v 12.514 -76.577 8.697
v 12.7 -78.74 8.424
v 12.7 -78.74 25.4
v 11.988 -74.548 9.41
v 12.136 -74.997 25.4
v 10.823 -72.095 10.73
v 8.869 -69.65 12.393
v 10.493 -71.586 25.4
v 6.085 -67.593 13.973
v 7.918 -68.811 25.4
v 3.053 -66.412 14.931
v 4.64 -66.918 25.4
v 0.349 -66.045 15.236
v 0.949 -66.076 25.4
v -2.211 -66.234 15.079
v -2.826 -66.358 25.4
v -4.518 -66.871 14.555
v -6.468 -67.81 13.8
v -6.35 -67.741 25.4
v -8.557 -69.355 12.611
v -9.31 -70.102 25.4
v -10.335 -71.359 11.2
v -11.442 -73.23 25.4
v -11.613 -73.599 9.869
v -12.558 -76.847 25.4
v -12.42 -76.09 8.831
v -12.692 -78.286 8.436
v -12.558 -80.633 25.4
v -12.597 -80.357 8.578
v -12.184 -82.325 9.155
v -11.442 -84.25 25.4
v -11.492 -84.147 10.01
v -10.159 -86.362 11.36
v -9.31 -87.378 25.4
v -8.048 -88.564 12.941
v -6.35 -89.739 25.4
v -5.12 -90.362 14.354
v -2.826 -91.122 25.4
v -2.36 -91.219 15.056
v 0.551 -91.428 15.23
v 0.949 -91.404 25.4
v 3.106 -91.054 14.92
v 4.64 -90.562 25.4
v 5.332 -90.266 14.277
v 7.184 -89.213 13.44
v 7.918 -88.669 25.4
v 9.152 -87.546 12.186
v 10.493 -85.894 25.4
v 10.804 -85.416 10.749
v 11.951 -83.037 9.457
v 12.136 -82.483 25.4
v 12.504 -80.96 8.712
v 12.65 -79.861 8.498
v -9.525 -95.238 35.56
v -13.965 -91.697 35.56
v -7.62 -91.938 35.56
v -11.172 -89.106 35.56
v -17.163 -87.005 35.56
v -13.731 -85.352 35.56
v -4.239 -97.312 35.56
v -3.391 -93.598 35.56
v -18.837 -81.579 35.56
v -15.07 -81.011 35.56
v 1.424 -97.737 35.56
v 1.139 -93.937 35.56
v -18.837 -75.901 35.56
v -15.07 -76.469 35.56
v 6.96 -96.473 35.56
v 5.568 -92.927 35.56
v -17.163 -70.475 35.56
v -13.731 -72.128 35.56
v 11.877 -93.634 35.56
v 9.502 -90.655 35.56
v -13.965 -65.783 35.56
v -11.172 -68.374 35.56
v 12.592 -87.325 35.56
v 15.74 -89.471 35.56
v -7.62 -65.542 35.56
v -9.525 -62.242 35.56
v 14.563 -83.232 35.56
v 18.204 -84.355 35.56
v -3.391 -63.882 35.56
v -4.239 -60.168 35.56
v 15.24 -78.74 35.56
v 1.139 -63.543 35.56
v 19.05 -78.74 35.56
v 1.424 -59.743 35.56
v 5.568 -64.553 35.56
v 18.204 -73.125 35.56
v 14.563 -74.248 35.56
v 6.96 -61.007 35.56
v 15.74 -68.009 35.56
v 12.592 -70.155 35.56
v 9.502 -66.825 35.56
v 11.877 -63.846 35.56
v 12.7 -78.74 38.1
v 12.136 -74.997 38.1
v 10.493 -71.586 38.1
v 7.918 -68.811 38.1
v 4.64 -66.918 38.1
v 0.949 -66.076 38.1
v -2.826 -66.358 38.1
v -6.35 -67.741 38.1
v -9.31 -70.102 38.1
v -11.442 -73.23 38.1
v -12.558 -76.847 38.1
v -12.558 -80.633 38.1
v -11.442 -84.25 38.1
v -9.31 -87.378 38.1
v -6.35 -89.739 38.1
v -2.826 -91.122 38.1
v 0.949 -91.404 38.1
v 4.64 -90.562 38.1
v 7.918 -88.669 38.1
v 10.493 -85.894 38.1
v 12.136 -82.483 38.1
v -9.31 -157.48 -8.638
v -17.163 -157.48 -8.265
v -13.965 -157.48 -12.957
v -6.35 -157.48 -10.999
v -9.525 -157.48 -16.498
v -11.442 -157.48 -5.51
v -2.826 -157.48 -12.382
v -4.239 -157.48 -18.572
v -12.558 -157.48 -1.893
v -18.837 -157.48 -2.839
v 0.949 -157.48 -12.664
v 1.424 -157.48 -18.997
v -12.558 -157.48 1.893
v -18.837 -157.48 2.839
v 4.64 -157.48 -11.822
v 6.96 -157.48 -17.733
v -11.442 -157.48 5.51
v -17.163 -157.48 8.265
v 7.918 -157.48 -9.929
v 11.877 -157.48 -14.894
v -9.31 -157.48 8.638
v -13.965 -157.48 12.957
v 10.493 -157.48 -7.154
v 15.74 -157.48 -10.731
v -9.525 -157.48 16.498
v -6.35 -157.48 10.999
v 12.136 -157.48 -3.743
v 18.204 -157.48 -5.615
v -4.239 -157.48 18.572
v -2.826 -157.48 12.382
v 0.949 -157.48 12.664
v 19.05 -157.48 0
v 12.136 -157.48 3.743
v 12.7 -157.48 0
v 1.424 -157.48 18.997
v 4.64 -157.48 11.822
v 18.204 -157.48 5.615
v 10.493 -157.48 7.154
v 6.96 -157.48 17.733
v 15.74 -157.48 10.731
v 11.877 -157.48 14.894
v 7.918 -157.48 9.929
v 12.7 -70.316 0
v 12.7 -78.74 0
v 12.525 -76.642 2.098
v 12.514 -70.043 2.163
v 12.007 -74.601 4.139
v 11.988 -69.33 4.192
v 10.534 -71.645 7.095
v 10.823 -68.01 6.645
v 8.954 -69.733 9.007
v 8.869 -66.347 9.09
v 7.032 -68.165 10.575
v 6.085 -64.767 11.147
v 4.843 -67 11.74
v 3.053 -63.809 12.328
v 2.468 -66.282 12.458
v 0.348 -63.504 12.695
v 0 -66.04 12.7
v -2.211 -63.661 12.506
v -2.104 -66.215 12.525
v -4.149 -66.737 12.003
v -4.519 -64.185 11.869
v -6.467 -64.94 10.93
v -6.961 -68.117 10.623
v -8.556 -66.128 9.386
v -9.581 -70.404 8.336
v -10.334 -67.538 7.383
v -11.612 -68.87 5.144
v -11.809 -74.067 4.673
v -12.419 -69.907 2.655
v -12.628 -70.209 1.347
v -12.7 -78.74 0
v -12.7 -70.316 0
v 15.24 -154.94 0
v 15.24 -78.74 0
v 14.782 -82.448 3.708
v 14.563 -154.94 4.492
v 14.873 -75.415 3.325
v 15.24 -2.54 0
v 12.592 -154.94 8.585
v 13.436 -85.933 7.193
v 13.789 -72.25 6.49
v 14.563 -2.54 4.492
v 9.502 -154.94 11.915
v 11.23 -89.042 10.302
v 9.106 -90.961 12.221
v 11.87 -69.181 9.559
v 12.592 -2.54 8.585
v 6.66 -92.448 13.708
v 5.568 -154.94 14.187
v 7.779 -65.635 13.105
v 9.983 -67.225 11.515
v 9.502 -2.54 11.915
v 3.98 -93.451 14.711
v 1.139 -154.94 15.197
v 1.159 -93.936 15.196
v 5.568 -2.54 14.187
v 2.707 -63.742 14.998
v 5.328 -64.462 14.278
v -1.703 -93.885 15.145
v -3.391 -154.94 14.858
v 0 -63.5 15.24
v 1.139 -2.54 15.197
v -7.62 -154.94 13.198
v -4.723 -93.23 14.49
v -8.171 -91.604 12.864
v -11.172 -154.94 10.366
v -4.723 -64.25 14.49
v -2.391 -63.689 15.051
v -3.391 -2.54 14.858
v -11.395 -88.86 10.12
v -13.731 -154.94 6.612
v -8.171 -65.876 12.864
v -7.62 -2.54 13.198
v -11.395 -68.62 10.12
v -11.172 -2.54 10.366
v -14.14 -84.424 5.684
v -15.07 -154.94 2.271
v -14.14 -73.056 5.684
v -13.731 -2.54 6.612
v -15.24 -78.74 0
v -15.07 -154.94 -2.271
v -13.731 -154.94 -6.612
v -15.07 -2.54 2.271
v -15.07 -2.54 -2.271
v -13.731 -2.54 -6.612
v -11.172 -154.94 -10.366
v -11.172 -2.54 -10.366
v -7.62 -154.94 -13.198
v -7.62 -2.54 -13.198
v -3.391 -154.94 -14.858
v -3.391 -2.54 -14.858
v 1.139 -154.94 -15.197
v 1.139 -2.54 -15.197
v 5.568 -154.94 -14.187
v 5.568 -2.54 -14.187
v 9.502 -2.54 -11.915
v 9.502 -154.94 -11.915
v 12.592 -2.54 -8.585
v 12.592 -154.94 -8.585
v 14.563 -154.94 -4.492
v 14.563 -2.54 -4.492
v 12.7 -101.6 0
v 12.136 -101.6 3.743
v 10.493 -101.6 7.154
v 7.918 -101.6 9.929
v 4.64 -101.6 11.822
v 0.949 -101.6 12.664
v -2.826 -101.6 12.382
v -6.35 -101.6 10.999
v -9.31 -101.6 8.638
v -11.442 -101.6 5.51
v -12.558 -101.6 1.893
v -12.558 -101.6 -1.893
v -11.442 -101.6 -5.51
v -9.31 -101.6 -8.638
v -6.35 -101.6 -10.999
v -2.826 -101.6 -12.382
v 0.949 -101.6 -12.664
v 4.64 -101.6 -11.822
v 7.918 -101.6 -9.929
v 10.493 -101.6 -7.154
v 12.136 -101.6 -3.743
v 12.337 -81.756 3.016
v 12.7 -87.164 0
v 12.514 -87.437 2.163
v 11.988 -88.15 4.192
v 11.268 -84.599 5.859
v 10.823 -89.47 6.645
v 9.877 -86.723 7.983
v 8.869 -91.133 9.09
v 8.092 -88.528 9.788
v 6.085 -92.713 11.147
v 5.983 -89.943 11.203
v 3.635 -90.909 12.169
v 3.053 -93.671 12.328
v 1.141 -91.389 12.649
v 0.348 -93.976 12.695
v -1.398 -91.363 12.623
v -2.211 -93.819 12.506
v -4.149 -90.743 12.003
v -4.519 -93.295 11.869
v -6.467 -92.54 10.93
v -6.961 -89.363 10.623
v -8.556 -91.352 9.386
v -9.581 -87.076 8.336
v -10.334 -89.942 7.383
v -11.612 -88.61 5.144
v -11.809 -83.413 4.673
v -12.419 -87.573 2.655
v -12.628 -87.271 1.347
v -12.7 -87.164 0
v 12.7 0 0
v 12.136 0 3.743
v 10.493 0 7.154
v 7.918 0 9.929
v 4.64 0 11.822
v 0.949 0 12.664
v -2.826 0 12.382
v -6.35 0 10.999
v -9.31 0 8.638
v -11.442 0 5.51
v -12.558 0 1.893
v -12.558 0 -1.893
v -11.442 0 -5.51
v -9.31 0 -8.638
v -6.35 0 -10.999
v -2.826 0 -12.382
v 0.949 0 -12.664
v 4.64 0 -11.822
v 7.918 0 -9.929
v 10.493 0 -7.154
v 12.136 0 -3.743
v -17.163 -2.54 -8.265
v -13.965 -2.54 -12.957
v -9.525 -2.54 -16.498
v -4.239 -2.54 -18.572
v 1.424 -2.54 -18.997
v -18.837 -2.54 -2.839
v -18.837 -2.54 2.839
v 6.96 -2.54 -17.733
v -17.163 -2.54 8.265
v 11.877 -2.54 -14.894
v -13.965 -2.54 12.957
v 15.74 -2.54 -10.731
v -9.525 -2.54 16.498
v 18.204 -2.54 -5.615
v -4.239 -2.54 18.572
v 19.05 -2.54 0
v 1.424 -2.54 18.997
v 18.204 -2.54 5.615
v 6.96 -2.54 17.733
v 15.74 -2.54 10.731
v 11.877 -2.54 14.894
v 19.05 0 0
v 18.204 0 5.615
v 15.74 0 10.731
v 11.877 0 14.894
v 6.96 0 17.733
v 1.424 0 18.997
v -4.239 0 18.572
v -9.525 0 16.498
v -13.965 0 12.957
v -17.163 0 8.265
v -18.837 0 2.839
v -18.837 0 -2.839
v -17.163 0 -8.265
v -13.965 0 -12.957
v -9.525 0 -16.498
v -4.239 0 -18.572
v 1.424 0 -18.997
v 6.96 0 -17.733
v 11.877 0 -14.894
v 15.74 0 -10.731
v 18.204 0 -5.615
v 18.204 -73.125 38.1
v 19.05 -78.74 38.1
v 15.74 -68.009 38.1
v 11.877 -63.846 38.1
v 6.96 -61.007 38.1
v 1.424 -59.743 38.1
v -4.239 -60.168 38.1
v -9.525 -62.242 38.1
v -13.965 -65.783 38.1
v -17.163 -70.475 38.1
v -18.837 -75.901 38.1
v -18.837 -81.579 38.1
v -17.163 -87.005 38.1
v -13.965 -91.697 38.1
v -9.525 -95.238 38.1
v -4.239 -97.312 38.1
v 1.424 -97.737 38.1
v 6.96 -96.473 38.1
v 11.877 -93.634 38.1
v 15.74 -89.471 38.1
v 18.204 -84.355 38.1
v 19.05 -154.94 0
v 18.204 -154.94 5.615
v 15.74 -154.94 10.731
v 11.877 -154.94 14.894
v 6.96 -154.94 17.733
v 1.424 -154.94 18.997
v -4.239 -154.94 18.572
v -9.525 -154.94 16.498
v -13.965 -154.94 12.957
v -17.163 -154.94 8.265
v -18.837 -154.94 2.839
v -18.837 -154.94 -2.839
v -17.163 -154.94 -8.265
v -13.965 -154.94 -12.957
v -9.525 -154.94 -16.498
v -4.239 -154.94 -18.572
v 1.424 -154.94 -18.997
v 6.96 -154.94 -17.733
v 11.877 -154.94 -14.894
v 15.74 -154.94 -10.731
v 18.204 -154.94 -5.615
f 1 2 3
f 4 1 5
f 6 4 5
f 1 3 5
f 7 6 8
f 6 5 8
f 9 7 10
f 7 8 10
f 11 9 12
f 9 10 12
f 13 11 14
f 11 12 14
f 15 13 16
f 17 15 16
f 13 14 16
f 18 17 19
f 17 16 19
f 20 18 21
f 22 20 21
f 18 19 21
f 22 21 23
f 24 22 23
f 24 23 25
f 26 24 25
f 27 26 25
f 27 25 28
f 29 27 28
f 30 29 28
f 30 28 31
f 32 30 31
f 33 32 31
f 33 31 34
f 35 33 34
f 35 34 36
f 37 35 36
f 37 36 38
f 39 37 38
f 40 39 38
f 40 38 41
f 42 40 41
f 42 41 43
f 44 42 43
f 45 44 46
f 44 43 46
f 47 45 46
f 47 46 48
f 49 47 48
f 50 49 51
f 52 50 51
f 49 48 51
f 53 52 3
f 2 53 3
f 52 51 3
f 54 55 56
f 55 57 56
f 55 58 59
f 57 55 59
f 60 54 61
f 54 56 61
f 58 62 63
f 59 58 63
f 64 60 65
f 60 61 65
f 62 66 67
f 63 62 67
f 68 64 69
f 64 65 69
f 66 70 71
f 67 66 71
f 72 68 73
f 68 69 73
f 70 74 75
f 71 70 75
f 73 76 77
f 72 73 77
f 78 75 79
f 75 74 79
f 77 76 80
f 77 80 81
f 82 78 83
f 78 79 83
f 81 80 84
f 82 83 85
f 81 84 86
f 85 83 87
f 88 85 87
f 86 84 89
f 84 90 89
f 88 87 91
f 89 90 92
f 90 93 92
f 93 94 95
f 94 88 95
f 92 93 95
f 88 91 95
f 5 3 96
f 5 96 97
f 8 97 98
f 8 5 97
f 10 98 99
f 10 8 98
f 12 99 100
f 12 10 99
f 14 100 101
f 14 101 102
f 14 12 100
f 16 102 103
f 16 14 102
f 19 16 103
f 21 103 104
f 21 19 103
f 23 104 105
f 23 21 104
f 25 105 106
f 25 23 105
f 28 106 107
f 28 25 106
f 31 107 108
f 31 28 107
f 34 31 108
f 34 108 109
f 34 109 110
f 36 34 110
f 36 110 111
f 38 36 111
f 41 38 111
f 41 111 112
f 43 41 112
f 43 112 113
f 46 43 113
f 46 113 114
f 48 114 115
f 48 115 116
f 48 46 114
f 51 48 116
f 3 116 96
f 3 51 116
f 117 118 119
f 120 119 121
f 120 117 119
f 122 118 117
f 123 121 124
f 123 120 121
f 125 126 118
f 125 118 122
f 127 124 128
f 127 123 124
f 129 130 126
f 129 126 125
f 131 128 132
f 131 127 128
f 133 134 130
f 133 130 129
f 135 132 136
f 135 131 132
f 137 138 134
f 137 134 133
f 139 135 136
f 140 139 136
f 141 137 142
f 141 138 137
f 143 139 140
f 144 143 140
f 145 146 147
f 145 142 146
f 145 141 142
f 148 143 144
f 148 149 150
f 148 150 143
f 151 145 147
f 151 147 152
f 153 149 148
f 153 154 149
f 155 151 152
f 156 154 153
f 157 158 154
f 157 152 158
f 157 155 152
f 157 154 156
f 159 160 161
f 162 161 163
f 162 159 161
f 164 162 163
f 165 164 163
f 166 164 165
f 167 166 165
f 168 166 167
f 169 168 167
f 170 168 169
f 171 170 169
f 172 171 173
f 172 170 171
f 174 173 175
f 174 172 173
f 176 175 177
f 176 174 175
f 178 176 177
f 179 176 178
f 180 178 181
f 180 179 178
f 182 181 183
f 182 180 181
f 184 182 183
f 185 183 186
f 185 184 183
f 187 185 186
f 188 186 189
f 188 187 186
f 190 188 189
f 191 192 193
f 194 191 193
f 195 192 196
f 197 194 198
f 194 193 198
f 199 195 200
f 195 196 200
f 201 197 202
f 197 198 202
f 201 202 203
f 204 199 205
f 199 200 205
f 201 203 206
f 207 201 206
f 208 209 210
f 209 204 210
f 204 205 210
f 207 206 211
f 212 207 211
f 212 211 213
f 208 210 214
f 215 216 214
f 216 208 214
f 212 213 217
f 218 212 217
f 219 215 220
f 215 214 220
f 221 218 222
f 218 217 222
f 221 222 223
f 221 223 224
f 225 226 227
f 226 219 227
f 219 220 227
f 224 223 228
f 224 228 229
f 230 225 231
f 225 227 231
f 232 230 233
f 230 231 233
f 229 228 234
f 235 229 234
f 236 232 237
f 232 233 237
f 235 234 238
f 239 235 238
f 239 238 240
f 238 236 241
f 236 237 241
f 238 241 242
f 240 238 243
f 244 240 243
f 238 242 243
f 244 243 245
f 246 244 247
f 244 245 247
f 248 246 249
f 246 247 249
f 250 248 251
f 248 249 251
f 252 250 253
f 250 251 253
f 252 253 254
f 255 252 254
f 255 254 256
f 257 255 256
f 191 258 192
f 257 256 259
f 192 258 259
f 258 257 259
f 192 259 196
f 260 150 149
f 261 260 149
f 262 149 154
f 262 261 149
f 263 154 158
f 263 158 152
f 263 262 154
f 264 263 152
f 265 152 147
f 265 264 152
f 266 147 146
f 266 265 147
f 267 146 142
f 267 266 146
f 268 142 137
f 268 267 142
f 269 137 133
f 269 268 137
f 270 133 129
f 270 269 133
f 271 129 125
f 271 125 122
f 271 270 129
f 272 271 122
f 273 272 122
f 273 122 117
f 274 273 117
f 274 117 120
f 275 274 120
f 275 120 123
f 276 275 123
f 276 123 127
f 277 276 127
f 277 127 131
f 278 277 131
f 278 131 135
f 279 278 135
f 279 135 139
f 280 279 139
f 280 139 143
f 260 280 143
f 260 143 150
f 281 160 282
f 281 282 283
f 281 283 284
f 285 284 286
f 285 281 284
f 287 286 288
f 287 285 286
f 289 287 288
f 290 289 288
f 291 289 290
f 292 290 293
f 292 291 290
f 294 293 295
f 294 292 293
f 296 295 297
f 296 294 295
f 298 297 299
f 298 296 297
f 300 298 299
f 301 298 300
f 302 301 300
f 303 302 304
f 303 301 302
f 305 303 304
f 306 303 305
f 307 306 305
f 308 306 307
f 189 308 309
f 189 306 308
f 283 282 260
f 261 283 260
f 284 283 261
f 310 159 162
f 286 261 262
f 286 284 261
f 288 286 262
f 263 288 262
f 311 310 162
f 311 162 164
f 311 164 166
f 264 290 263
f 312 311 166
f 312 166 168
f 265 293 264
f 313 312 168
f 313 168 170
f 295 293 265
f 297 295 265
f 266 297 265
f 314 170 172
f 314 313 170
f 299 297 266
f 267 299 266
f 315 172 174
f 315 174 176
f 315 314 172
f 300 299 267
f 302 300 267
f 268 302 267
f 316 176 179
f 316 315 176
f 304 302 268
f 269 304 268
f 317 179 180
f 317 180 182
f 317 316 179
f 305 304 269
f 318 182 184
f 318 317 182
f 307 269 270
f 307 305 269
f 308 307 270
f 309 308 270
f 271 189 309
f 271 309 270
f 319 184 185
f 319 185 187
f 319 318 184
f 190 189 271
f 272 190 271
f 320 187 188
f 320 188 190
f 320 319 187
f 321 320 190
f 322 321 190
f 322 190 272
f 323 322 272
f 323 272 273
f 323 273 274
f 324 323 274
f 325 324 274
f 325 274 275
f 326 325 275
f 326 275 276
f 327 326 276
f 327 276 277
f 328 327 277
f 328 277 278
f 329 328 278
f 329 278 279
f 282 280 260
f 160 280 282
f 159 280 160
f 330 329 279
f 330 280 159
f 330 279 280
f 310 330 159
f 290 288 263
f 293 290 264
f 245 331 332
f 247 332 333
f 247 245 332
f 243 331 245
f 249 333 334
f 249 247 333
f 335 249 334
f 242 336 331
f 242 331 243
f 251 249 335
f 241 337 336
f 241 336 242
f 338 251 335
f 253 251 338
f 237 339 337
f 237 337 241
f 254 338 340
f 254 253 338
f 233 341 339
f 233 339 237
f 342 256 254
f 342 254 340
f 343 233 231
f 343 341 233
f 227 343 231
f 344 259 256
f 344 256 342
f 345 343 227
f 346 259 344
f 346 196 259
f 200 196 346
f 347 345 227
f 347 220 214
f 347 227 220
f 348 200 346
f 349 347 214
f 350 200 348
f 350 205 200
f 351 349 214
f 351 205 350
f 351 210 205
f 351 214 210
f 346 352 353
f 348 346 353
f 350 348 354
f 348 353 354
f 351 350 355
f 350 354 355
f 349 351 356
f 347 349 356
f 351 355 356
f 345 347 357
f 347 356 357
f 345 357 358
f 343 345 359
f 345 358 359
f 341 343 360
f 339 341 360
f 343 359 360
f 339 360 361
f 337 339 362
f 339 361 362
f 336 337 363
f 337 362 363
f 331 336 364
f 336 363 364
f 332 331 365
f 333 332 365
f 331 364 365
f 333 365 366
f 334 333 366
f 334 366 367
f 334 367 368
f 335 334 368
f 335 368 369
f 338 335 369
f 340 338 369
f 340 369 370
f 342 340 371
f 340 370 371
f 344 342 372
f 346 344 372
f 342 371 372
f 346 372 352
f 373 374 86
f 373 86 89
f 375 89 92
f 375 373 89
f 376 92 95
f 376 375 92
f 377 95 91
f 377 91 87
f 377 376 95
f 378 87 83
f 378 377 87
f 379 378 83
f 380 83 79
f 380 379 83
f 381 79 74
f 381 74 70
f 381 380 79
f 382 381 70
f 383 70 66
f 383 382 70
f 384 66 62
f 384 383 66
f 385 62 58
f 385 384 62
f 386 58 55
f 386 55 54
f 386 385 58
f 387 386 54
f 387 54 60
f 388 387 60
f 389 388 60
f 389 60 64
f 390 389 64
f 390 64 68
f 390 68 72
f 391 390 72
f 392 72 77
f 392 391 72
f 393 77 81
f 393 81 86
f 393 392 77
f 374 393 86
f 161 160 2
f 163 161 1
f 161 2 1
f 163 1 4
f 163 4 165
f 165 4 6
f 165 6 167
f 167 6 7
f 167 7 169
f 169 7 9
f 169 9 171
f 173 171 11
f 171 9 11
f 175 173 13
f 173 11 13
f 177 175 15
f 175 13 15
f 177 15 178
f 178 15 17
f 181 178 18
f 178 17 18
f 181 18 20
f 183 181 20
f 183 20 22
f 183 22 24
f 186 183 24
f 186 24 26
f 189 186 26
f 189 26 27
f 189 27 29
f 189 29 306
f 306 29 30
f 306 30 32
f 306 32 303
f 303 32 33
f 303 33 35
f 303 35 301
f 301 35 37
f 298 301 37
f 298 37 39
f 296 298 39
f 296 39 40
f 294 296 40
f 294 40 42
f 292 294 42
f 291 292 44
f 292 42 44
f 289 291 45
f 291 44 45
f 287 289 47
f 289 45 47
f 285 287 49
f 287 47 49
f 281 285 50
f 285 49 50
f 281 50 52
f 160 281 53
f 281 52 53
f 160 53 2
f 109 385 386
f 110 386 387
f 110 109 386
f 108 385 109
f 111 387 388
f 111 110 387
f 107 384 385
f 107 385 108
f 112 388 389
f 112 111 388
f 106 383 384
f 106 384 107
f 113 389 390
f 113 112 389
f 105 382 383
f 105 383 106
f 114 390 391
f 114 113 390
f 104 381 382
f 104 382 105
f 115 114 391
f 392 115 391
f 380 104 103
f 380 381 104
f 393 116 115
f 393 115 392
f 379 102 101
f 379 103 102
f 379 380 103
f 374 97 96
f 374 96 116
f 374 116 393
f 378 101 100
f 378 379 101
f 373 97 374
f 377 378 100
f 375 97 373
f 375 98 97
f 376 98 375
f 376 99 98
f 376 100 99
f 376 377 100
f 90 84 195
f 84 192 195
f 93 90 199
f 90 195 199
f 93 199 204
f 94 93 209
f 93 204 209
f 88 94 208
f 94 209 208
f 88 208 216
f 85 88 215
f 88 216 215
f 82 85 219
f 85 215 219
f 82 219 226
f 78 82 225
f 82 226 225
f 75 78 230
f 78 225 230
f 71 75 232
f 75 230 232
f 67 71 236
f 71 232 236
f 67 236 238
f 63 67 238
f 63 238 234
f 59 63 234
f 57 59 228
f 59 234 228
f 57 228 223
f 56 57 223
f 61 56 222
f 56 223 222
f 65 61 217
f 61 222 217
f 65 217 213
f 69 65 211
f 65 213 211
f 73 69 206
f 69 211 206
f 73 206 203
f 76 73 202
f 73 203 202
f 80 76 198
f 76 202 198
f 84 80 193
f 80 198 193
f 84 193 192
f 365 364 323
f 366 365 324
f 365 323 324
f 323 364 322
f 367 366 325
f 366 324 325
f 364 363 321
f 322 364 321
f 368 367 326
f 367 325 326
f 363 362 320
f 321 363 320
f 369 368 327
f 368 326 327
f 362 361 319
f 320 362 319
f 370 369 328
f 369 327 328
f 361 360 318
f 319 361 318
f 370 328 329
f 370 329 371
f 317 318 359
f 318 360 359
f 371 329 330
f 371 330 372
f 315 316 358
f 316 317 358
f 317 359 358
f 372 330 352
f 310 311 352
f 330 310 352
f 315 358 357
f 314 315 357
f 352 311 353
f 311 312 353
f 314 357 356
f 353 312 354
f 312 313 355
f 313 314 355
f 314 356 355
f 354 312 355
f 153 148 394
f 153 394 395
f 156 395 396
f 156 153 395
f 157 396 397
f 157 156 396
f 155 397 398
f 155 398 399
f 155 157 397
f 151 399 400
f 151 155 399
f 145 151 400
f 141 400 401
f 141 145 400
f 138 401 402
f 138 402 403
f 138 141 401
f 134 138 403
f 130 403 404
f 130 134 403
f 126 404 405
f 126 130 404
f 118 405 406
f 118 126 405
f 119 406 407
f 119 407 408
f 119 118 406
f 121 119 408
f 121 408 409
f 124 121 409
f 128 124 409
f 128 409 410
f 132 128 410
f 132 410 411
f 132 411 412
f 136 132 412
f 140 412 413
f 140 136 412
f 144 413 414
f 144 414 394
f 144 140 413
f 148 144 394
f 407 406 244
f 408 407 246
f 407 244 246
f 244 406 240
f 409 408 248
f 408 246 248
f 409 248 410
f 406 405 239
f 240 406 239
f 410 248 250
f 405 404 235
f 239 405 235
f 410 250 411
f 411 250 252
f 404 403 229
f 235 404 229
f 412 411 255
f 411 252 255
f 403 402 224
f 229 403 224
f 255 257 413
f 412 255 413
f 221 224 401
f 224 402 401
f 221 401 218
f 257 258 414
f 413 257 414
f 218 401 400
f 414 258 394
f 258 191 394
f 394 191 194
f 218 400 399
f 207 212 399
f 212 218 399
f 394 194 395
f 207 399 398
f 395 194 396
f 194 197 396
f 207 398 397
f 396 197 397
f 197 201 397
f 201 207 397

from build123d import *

# Parameters (mm, degrees)
F0_R          = 15.24
F0_R_2        = 12.7
F1_DEPTH      = 157.48
F0_R_3        = 19.05
F2_DEPTH      = 2.54
F3_R          = 19.05
F3_R_2        = 15.24
F4_DEPTH      = 2.54
F6_R          = 15.24
F6_R_2        = 12.7
F7_DEPTH      = 25.4
F7_DEPTH_BACK = 12.7
F8_R          = 19.05
F8_R_2        = 15.24
F9_DEPTH      = 2.54
F10_DEPTH     = 101.6
F8_R_3        = 12.7
F11_DEPTH     = 38.1


with BuildPart() as f1:
    # F0 (on Front) → F1 (new body)
    with BuildSketch(Plane.XZ):
        Circle(F0_R)
        Circle(F0_R_2, mode=Mode.SUBTRACT)
    extrude(amount=F1_DEPTH)

    # F0 (on Front) → F2 (join)
    with BuildSketch(Plane.XZ):
        Circle(F0_R_3)
        Circle(F0_R, mode=Mode.SUBTRACT)
    extrude(amount=F2_DEPTH)

    # F3 (on face) → F4 (join)
    with BuildSketch(Plane.XZ.offset(157.48)):
        Circle(F3_R)
        Circle(F3_R_2, mode=Mode.SUBTRACT)
    extrude(amount=-F4_DEPTH)

    # F6 (on offset) → F7 (join, two sides)
    with BuildSketch(Plane.XY.offset(25.4)) as f7_sk:
        with Locations((0, -78.74)):
            Circle(F6_R)
        with Locations((0, -78.74)):
            Circle(F6_R_2, mode=Mode.SUBTRACT)
    extrude(amount=-F7_DEPTH)
    extrude(f7_sk.sketch, amount=F7_DEPTH_BACK)

    # F8 (on face) → F9 (join)
    with BuildSketch(Plane.XY.offset(38.1)):
        with Locations((0, -78.74)):
            Circle(F8_R)
        with Locations((0, -78.74)):
            Circle(F8_R_2, mode=Mode.SUBTRACT)
    extrude(amount=-F9_DEPTH)

    # F0 (on Front) → F10 (cut)
    with BuildSketch(Plane.XZ):
        Circle(F0_R_2)
    extrude(amount=F10_DEPTH, mode=Mode.SUBTRACT)

    # F8 (on face) → F11 (cut)
    with BuildSketch(Plane.XY.offset(38.1)):
        with Locations((0, -78.74)):
            Circle(F8_R_3)
    extrude(amount=-F11_DEPTH, mode=Mode.SUBTRACT)


solid = f1.part
